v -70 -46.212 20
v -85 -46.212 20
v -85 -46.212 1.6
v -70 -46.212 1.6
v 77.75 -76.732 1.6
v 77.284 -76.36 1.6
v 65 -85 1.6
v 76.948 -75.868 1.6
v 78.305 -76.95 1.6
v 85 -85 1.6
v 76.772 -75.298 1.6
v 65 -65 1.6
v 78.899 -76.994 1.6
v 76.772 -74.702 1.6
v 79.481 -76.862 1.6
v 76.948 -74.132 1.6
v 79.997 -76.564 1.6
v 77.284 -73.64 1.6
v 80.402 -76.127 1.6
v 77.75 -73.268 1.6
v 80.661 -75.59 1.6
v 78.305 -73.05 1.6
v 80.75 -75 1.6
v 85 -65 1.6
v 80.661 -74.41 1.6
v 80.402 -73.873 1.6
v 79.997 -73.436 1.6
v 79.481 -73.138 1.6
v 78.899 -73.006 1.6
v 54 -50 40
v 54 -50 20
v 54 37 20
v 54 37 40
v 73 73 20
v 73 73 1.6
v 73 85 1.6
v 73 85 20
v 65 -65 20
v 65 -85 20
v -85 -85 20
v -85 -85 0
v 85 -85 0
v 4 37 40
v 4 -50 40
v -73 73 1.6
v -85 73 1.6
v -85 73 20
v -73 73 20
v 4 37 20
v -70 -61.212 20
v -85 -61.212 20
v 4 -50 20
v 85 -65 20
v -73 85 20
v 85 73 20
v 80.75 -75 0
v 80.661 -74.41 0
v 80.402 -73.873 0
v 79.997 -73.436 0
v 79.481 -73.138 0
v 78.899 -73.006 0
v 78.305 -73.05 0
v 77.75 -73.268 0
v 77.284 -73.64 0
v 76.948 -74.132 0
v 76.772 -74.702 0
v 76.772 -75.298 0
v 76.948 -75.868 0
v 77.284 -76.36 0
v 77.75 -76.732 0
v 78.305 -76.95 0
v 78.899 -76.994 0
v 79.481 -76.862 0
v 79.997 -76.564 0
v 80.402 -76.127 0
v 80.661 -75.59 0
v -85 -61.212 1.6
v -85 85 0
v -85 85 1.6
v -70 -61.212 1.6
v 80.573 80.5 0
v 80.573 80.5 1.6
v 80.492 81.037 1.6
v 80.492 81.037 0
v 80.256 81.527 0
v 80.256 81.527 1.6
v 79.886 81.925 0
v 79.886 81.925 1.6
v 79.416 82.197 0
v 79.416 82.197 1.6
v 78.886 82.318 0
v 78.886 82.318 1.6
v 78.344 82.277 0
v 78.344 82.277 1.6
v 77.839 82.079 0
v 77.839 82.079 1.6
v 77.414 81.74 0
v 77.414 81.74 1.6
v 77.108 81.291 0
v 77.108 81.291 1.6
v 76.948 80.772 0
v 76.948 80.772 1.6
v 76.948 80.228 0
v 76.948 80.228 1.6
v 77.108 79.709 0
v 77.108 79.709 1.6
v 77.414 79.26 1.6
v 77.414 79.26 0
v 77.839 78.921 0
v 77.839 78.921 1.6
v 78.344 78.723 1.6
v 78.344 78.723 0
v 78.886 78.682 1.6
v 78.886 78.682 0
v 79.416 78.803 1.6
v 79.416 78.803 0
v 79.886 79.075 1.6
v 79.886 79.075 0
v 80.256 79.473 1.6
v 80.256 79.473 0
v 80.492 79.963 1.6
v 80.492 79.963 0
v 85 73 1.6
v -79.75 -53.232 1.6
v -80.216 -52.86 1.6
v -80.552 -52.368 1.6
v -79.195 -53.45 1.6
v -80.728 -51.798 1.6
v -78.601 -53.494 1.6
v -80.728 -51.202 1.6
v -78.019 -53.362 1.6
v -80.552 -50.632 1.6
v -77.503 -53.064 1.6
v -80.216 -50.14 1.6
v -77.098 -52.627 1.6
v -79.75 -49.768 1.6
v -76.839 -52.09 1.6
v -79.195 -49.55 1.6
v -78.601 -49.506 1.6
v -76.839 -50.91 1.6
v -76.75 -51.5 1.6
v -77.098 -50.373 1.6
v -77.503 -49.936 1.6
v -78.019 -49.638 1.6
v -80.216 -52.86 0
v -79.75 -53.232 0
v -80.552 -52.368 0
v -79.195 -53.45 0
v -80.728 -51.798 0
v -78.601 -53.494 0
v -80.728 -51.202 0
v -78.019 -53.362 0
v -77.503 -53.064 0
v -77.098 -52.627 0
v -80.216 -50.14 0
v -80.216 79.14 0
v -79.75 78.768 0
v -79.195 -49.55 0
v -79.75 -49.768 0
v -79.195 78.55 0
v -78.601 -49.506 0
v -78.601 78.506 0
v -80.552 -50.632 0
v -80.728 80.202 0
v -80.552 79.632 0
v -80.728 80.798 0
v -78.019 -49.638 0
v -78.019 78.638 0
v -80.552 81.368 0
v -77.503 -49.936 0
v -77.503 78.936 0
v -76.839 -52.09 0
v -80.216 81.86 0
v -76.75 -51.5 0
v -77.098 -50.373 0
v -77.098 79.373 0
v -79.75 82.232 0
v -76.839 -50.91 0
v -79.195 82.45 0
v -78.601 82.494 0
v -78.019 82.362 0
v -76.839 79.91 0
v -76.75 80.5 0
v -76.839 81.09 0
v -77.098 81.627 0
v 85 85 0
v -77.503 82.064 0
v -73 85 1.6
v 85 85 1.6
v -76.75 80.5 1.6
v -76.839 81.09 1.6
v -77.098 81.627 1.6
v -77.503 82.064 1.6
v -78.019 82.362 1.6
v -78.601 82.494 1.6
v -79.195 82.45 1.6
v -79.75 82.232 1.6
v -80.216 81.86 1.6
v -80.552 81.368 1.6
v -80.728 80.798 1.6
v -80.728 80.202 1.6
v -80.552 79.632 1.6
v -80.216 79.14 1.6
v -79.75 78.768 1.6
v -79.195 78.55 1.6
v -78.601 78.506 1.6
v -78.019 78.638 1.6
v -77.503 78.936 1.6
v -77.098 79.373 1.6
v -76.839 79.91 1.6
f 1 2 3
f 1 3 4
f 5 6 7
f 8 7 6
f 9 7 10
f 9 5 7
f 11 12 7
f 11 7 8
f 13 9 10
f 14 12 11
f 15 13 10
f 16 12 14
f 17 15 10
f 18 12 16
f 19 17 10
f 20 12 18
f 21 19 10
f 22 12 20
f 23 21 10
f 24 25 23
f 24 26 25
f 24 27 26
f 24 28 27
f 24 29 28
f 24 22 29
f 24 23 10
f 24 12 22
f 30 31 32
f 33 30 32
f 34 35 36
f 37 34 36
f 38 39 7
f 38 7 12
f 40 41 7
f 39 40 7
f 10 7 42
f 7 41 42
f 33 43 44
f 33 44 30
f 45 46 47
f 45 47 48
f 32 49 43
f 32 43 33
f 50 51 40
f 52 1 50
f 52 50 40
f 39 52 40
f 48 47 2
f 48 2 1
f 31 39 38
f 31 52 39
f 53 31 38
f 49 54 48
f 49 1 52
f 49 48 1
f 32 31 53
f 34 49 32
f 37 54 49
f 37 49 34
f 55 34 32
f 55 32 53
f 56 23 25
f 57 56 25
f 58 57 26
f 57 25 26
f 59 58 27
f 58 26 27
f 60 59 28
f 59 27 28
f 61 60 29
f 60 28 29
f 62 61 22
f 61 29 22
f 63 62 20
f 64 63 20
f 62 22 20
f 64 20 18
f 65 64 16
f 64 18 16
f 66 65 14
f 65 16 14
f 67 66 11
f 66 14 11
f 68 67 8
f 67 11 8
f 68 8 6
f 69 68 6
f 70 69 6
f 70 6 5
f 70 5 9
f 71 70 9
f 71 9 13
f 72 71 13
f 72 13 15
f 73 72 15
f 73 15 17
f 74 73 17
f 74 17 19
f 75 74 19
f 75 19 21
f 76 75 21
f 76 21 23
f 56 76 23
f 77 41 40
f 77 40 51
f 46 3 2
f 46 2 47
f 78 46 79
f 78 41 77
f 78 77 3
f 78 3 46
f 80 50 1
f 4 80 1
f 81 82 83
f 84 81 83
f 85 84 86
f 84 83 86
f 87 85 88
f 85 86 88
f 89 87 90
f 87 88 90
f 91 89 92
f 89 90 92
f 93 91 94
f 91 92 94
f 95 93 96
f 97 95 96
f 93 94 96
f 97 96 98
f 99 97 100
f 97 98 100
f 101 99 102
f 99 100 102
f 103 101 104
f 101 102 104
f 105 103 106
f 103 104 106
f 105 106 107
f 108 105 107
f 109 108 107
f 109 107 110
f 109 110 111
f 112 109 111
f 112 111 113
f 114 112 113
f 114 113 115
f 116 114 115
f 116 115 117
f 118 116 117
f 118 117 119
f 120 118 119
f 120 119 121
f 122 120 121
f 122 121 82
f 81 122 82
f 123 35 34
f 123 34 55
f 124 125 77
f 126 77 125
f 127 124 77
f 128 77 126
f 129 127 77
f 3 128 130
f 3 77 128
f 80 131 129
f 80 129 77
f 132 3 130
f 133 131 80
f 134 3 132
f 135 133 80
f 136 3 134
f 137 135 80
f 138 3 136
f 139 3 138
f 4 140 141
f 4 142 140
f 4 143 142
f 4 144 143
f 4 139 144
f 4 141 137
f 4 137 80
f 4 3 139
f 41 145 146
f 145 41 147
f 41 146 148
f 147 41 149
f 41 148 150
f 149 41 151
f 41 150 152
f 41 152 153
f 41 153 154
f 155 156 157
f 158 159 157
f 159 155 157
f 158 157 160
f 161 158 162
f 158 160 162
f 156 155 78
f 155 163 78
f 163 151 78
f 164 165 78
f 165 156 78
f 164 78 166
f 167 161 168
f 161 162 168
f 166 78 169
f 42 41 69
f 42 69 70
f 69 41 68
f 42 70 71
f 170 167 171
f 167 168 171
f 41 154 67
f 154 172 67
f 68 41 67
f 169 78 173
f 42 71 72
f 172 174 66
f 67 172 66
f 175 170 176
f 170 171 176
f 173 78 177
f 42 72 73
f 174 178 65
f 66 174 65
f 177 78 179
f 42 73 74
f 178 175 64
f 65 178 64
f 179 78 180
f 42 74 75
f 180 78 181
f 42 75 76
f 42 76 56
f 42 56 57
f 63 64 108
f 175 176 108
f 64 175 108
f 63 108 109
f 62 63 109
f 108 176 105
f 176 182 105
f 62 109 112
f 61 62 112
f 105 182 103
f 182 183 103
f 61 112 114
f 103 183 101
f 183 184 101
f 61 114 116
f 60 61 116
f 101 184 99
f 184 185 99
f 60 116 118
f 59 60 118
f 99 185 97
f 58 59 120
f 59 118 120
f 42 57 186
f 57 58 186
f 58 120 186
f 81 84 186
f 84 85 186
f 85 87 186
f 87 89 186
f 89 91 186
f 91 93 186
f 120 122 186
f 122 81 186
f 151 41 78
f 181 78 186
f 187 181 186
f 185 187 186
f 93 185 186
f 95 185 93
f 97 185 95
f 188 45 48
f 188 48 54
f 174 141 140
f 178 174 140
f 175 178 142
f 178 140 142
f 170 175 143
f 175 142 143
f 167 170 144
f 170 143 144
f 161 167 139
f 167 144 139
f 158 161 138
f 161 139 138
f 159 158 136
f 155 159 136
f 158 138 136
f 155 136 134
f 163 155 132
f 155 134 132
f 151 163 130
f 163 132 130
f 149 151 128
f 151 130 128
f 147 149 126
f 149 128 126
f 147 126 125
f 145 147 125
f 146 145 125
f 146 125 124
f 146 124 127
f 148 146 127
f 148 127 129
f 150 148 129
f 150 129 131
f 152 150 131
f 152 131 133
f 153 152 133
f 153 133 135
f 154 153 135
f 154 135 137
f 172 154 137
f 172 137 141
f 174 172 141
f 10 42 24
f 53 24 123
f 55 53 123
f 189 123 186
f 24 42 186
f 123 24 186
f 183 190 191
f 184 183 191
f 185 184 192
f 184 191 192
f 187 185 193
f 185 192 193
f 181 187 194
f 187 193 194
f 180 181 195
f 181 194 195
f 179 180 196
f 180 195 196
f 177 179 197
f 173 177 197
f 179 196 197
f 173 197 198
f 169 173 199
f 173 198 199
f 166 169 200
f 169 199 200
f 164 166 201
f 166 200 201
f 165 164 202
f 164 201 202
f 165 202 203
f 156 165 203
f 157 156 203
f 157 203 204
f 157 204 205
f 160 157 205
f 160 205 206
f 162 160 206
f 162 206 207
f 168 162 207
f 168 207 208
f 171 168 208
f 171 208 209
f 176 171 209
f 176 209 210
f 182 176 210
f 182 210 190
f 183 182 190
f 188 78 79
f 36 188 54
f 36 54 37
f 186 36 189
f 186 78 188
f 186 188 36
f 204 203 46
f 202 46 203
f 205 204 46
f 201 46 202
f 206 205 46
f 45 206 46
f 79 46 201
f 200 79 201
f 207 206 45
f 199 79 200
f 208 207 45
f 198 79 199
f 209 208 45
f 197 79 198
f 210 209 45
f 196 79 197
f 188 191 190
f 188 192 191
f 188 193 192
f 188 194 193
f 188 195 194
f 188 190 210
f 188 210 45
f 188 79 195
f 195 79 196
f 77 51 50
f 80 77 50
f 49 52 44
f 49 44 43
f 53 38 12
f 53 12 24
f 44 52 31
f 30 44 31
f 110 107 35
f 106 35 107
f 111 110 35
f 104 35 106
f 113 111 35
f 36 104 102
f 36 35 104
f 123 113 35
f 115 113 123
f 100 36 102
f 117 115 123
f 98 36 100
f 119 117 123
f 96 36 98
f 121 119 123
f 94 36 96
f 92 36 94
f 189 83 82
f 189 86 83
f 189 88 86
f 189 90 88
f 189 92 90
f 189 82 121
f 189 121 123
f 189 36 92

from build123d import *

# Parameters (mm, degrees)
SKETCH_1_W          = 170
SKETCH_1_H          = 170
EXTRUDE_1_DEPTH     = 20
SKETCH_2_W          = 20
SKETCH_2_H          = 20
SKETCH_2_W_2        = 12
SKETCH_2_H_2        = 12
SKETCH_2_W_3        = 15
SKETCH_2_H_3        = 15
CUT_EXTRUDE_1_DEPTH = 18.4
SKETCH_3_R          = 2
SKETCH_3_R_2        = 1.82271494
CUT_EXTRUDE_2_DEPTH = 18.4
SKETCH_4_W          = 50
SKETCH_4_H          = 87
EXTRUDE_2_DEPTH     = 20


with BuildPart() as part:
    # 草圖1 → 填料-伸長1 (new body)
    with BuildSketch(Plane.XY):
        Rectangle(SKETCH_1_W, SKETCH_1_H)
    extrude(amount=EXTRUDE_1_DEPTH)

    # 草圖2 → 除料-伸長1 (cut)
    with BuildSketch(Plane.XY.offset(20)):
        with Locations((75, -75)):
            Rectangle(SKETCH_2_W, SKETCH_2_H)
        with Locations((79, 79)):
            Rectangle(SKETCH_2_W_2, SKETCH_2_H_2)
        with Locations((-79, 79)):
            Rectangle(SKETCH_2_W_2, SKETCH_2_H_2)
        with Locations((-77.5, -53.711717692)):
            Rectangle(SKETCH_2_W_3, SKETCH_2_H_3)
    extrude(amount=-CUT_EXTRUDE_1_DEPTH, mode=Mode.SUBTRACT)

    # 草圖3 → 除料-伸長2 (cut)
    with BuildSketch(Plane.XY.offset(1.6)):
        with Locations((78.75, -75)):
            Circle(SKETCH_3_R)
        with Locations((78.75, 80.5)):
            Circle(SKETCH_3_R_2)
        with Locations((-78.75, 80.5)):
            Circle(SKETCH_3_R)
        with Locations((-78.75, -51.5)):
            Circle(SKETCH_3_R)
    extrude(amount=-CUT_EXTRUDE_2_DEPTH, mode=Mode.SUBTRACT)

    # 草圖4 → 填料-伸長2 (add)
    with BuildSketch(Plane.XY.offset(20)):
        with Locations((29, -6.5)):
            Rectangle(SKETCH_4_W, SKETCH_4_H)
    extrude(amount=EXTRUDE_2_DEPTH)


solid = part.part
